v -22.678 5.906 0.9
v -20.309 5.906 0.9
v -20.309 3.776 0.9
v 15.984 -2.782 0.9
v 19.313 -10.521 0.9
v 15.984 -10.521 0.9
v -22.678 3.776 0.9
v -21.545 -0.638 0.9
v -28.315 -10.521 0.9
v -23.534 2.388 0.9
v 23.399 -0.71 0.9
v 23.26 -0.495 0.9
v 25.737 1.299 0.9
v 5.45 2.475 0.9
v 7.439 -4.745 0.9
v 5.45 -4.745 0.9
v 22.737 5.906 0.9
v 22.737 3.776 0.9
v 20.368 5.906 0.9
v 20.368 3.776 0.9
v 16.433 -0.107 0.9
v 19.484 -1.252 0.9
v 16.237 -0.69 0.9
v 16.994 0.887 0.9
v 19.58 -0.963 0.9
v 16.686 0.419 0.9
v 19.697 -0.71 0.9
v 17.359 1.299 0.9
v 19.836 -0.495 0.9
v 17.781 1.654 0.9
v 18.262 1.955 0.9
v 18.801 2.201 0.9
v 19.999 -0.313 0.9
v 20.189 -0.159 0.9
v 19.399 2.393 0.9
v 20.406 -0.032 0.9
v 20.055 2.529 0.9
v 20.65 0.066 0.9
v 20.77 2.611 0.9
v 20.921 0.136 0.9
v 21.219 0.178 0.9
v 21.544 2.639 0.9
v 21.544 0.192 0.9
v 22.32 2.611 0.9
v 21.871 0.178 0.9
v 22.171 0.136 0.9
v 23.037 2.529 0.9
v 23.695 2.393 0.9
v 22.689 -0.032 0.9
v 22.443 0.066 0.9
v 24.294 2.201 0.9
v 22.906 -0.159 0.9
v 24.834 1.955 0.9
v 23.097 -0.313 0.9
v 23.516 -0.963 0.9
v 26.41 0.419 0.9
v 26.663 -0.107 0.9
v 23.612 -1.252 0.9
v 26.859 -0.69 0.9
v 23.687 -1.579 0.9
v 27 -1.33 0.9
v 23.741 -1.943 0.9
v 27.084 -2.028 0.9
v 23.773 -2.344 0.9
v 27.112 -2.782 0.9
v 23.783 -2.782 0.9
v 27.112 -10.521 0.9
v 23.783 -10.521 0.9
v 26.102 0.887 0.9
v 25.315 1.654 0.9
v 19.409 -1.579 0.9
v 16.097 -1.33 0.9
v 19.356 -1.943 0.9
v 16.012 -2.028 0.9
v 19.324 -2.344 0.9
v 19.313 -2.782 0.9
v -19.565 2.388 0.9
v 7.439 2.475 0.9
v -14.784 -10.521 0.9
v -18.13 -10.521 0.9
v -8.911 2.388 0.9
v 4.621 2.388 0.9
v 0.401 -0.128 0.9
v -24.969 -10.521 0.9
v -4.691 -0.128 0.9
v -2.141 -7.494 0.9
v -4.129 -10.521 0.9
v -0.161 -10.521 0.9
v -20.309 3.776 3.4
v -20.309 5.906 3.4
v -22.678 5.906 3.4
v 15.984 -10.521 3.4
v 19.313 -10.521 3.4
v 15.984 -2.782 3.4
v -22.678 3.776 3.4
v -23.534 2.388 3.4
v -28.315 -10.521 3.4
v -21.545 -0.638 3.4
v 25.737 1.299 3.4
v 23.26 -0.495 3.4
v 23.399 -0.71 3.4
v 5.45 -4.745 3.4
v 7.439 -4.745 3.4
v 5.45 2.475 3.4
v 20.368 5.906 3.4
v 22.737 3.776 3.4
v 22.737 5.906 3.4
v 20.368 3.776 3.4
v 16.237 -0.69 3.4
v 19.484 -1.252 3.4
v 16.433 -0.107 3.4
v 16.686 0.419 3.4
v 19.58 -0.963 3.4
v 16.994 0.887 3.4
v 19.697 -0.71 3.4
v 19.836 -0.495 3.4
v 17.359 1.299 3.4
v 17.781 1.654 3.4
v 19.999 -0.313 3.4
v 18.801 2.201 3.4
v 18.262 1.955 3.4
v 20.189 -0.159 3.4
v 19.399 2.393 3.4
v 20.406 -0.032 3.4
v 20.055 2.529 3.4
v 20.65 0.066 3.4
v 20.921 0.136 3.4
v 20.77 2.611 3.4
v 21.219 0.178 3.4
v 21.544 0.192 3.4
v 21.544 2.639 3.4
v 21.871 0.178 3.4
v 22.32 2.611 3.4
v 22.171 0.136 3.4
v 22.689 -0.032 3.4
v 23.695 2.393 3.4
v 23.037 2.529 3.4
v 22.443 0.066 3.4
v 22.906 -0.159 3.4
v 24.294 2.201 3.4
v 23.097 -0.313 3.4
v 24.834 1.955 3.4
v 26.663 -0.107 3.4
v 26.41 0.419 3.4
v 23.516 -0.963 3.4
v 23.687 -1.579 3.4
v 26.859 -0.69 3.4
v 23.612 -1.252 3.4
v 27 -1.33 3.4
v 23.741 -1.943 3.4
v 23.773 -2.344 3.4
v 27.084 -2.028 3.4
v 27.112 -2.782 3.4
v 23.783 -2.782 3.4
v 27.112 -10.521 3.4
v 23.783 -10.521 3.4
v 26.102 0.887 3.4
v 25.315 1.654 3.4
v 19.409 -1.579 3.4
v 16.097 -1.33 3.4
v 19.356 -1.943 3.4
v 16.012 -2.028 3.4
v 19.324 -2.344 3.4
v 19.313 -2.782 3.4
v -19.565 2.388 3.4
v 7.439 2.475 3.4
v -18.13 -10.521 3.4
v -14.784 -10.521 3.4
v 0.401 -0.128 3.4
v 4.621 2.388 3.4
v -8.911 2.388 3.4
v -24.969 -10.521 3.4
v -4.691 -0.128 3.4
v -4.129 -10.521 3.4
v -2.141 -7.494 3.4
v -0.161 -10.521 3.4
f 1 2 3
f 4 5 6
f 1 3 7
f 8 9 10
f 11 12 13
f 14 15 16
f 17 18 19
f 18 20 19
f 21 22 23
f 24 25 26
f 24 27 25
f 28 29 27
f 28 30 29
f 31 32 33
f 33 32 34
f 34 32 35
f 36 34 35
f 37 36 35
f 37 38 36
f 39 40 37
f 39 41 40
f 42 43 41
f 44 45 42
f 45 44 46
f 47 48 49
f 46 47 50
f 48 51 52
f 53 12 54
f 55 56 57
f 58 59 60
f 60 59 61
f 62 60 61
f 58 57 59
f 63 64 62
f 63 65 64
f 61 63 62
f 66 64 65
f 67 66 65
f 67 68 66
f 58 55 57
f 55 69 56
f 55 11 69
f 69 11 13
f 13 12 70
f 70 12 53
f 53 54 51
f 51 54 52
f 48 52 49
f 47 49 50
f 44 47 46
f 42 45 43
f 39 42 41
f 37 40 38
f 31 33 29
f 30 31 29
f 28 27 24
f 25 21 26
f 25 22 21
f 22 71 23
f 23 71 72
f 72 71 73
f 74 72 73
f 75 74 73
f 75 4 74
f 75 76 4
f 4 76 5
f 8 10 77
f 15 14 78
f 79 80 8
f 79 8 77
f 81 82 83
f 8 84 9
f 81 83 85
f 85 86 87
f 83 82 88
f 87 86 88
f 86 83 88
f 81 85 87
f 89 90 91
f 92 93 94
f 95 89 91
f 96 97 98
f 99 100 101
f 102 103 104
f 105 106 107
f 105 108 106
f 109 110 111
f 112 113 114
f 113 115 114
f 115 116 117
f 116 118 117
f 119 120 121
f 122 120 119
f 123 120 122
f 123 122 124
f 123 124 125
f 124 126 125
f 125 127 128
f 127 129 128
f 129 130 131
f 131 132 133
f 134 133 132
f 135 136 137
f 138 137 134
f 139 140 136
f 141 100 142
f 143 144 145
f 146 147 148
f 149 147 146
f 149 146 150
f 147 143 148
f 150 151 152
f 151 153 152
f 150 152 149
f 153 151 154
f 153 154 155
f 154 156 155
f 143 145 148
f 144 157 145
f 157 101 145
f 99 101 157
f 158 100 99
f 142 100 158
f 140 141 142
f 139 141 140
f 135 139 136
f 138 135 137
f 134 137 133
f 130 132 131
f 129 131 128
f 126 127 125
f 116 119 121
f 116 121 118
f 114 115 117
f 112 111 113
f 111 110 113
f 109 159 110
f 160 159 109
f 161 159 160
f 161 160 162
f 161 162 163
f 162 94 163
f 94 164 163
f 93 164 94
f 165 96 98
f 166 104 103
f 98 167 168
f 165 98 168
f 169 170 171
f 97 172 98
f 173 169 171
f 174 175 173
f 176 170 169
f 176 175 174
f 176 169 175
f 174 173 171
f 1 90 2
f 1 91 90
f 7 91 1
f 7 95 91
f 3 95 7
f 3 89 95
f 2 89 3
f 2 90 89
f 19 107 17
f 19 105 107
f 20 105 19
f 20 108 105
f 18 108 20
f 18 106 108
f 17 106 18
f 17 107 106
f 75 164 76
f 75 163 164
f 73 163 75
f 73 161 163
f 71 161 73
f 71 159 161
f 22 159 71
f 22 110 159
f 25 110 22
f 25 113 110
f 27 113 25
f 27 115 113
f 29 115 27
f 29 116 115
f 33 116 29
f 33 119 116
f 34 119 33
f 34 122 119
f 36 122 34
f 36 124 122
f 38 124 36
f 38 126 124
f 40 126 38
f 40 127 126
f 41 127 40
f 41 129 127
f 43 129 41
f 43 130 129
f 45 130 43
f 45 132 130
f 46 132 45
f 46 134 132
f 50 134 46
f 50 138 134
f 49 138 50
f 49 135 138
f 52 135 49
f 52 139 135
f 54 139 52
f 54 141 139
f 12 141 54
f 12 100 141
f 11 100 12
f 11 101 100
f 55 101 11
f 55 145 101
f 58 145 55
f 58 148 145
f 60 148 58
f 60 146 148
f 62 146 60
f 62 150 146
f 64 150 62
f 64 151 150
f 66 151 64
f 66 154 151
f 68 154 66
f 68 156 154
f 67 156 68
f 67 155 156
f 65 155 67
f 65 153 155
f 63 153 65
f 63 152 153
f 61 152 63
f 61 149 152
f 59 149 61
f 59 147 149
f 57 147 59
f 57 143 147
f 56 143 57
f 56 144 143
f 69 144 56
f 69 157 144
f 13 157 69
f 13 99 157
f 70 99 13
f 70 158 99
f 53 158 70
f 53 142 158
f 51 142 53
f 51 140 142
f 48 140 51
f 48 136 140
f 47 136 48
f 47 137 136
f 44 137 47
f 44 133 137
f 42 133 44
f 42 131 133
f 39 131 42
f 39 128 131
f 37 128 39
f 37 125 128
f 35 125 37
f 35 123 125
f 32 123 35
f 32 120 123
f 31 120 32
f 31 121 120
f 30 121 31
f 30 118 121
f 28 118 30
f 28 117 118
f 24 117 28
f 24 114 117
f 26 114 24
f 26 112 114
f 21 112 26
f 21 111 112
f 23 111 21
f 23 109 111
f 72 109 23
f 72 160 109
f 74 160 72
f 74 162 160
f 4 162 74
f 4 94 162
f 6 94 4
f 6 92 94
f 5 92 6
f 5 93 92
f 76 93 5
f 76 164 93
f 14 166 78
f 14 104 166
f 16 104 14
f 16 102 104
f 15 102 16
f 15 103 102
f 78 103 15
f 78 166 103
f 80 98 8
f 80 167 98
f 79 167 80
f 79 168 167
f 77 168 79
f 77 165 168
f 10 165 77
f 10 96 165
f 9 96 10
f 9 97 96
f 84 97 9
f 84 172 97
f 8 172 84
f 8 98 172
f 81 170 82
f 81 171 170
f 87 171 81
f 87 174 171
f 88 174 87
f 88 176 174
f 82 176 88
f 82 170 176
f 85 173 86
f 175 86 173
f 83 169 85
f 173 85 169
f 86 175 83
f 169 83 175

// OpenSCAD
$fn = 48;
  // syllabics (overlaid on icon, tallest)
  translate([0, -2.500, 0.900]) linear_extrude(height=2.500) text("ᐲ ᐁᑊ ᑏ", size=12.750, halign="center", valign="center", font="Euphemia UCAS:style=Bold");
